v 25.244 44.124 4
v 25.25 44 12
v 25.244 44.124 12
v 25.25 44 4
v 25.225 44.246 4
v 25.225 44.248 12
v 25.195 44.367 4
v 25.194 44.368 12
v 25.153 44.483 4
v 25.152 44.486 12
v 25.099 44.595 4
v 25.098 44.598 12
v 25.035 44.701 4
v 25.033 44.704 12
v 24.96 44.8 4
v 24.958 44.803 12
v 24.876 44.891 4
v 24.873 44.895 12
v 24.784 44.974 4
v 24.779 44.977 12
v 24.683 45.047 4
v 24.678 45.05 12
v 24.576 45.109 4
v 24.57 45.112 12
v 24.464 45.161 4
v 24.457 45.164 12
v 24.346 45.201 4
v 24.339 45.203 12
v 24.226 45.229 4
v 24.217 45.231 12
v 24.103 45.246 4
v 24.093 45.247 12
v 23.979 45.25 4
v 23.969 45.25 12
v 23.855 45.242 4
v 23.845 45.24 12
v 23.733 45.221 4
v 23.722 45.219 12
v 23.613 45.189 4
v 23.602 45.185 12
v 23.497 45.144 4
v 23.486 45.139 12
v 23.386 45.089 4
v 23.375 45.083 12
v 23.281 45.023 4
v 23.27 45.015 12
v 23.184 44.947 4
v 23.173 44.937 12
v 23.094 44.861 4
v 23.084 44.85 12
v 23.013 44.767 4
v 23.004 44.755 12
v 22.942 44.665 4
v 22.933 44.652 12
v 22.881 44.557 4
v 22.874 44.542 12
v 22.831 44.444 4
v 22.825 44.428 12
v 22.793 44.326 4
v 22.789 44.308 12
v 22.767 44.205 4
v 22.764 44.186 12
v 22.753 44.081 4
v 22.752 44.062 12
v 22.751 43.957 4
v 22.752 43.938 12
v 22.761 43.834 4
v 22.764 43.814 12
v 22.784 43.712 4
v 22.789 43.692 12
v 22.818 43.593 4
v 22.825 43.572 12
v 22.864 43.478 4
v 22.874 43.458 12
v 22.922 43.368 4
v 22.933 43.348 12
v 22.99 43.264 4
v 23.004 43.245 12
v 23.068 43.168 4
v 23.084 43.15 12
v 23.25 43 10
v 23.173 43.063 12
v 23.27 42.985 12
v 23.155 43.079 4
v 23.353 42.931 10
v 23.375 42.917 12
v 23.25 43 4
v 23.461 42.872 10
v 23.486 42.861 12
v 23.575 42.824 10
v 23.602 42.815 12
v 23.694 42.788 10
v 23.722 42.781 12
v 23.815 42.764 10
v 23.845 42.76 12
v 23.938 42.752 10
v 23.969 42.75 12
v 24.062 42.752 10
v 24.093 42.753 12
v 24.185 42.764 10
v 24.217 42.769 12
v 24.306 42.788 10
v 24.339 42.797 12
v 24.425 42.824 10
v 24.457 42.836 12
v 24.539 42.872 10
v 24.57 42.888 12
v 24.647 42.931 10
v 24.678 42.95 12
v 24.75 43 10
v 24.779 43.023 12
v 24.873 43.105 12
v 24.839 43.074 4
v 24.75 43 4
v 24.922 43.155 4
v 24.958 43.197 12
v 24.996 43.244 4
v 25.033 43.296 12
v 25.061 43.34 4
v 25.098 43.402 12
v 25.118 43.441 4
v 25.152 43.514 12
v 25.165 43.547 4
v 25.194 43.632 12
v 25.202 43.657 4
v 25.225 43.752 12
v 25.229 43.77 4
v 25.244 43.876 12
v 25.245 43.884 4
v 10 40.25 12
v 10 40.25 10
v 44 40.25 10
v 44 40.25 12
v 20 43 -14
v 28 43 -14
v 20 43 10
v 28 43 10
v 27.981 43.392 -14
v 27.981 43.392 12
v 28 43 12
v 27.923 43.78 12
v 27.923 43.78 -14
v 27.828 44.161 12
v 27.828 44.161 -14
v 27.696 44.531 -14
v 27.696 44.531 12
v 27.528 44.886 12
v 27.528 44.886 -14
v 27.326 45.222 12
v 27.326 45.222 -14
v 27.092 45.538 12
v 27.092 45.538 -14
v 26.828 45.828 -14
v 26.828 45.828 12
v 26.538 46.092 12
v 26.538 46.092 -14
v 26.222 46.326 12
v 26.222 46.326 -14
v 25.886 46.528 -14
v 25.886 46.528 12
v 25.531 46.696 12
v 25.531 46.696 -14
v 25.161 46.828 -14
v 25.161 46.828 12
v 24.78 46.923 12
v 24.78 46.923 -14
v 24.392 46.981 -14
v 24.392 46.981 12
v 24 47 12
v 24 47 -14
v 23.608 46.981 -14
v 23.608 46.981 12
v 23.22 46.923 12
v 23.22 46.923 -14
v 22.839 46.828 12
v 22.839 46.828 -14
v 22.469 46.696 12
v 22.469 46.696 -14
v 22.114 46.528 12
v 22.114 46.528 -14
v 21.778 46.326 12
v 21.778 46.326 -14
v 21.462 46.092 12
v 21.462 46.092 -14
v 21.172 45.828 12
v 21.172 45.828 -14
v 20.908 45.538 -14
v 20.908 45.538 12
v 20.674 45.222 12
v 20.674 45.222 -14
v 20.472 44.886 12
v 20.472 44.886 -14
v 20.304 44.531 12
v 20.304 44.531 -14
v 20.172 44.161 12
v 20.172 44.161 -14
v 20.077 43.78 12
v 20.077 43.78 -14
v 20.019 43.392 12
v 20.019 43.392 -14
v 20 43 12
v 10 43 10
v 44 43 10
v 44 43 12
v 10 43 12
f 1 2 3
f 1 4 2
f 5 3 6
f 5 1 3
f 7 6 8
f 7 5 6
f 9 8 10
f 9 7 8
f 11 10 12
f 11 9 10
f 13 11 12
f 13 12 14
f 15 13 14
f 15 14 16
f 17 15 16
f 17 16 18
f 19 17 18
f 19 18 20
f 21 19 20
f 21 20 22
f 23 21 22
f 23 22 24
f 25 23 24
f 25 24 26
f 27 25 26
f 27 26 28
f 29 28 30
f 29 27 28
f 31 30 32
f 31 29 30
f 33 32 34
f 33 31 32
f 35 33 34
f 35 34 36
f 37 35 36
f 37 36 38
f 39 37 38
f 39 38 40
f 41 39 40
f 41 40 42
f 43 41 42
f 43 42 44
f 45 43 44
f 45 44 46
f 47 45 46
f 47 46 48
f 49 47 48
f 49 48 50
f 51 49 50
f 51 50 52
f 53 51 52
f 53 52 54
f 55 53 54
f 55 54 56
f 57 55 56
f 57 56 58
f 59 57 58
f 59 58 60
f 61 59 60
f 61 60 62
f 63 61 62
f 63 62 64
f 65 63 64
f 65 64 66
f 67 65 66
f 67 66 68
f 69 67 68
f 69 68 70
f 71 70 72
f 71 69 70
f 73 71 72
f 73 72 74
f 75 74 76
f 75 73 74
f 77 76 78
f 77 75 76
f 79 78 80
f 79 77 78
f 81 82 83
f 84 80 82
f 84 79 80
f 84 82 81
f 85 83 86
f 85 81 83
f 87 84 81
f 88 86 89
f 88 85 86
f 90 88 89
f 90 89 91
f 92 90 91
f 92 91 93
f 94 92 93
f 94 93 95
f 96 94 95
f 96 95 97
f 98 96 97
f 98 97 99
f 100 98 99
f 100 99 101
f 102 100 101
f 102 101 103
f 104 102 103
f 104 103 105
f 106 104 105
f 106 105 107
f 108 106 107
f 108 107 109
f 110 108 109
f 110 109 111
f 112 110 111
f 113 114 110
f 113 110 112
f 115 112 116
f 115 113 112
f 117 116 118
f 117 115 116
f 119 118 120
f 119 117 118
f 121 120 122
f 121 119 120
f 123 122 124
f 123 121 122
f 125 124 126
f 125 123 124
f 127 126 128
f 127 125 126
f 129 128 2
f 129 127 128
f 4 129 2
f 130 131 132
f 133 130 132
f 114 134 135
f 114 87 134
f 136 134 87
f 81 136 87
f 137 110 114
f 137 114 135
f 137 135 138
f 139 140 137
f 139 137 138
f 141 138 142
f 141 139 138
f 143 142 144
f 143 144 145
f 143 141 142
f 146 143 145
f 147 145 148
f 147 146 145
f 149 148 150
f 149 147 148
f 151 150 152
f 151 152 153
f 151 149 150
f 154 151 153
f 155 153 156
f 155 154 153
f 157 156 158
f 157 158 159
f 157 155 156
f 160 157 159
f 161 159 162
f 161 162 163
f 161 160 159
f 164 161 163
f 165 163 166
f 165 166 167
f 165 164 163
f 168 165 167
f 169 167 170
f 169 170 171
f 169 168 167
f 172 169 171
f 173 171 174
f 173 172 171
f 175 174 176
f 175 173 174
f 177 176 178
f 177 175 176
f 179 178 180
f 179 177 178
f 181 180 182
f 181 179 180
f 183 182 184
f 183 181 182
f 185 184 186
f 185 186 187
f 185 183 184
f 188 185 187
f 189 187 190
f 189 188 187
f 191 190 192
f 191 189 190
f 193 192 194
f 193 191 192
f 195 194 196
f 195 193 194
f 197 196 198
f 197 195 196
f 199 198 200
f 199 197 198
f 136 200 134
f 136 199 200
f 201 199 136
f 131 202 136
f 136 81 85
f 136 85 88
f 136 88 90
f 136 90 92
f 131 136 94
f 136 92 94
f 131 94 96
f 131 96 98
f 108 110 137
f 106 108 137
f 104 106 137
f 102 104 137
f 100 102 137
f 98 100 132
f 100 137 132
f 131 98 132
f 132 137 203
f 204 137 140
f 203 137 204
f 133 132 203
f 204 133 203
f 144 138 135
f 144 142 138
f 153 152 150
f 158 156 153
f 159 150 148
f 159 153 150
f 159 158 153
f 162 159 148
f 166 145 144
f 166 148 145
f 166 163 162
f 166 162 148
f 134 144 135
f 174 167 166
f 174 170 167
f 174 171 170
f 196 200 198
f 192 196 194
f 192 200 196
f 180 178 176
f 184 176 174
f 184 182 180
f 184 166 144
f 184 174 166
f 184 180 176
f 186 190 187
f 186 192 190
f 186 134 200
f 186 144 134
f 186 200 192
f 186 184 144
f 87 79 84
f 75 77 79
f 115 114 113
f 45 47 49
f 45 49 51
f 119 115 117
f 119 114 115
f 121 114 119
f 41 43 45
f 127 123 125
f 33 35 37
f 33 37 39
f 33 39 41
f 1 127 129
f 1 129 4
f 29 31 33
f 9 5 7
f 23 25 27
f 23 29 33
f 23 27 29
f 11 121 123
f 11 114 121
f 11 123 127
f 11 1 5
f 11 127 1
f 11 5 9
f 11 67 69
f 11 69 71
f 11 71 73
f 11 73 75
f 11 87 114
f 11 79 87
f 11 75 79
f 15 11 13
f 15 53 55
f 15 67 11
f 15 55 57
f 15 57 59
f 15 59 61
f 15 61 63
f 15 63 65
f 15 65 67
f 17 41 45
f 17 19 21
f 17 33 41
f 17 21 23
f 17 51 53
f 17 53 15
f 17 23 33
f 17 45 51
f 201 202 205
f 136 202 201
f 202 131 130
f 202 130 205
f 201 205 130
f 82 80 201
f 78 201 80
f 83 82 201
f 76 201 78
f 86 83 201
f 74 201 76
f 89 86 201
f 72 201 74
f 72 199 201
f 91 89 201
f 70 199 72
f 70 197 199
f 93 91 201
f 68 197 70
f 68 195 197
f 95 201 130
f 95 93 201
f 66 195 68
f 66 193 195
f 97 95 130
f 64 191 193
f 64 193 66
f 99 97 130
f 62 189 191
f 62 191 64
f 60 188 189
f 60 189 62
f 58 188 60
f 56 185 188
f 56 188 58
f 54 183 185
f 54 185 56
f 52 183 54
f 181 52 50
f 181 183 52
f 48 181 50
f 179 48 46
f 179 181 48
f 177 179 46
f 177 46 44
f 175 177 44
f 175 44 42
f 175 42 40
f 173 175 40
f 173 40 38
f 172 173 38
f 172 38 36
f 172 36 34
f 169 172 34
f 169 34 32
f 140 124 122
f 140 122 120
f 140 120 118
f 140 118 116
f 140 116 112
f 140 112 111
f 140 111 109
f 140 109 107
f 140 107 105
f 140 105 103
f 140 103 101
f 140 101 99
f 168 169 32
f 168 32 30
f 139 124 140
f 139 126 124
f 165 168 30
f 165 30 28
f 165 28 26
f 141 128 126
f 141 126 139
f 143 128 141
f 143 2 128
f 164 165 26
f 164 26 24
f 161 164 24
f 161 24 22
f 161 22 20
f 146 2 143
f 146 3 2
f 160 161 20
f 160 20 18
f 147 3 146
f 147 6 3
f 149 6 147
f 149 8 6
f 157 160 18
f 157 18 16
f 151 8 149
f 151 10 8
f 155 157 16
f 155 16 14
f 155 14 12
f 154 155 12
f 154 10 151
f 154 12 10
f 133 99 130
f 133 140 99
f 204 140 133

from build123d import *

# Parameters (mm, degrees)
CYLINDER028_R     = 1.25
CYLINDER028_DEPTH = 10
BOX030_W          = 34
BOX030_H          = 2.75
BOX030_DEPTH      = 2
CYLINDER025_W     = 4
CYLINDER025_H     = 26
CYLINDER025_ANGLE = 180


with BuildPart() as b_no002:
    # Cylinder028 → Cylinder028 (new body)
    with BuildSketch(Plane(origin=(11, 29, 4), x_dir=(1, 0, 0), z_dir=(0, 0, 1))):
        Circle(CYLINDER028_R)
    extrude(amount=CYLINDER028_DEPTH)


with BuildPart() as n016:
    # Box030 → Box030 (new body)
    with BuildSketch(Plane(origin=(-3, 25.25, 10), x_dir=(1, 0, 0), z_dir=(0, 0, 1))):
        with Locations((17, 1.375)):
            Rectangle(BOX030_W, BOX030_H)
    extrude(amount=BOX030_DEPTH)


with BuildPart() as cut011_nnw:
    # Cylinder025 → Cylinder025 (revolve)
    with BuildSketch(Plane(origin=(11, 28, -14), x_dir=(1, 0, 0), z_dir=(0, -1, 0))):
        with Locations((2, 13)):
            Rectangle(CYLINDER025_W, CYLINDER025_H)
    revolve(axis=Axis((11, 28, -14), (0, 0, 1)), revolution_arc=CYLINDER025_ANGLE)

    # Fusion005: union N016
    add(n016.part)

    # Cut011: cut B_NO002
    add(b_no002.part, mode=Mode.SUBTRACT)


with BuildPart() as cut011_nnw_1:
    # Cut011 placement: moved
    add(cut011_nnw.part.moved(Location((13, 15, 0))))


solid = cut011_nnw_1.part
